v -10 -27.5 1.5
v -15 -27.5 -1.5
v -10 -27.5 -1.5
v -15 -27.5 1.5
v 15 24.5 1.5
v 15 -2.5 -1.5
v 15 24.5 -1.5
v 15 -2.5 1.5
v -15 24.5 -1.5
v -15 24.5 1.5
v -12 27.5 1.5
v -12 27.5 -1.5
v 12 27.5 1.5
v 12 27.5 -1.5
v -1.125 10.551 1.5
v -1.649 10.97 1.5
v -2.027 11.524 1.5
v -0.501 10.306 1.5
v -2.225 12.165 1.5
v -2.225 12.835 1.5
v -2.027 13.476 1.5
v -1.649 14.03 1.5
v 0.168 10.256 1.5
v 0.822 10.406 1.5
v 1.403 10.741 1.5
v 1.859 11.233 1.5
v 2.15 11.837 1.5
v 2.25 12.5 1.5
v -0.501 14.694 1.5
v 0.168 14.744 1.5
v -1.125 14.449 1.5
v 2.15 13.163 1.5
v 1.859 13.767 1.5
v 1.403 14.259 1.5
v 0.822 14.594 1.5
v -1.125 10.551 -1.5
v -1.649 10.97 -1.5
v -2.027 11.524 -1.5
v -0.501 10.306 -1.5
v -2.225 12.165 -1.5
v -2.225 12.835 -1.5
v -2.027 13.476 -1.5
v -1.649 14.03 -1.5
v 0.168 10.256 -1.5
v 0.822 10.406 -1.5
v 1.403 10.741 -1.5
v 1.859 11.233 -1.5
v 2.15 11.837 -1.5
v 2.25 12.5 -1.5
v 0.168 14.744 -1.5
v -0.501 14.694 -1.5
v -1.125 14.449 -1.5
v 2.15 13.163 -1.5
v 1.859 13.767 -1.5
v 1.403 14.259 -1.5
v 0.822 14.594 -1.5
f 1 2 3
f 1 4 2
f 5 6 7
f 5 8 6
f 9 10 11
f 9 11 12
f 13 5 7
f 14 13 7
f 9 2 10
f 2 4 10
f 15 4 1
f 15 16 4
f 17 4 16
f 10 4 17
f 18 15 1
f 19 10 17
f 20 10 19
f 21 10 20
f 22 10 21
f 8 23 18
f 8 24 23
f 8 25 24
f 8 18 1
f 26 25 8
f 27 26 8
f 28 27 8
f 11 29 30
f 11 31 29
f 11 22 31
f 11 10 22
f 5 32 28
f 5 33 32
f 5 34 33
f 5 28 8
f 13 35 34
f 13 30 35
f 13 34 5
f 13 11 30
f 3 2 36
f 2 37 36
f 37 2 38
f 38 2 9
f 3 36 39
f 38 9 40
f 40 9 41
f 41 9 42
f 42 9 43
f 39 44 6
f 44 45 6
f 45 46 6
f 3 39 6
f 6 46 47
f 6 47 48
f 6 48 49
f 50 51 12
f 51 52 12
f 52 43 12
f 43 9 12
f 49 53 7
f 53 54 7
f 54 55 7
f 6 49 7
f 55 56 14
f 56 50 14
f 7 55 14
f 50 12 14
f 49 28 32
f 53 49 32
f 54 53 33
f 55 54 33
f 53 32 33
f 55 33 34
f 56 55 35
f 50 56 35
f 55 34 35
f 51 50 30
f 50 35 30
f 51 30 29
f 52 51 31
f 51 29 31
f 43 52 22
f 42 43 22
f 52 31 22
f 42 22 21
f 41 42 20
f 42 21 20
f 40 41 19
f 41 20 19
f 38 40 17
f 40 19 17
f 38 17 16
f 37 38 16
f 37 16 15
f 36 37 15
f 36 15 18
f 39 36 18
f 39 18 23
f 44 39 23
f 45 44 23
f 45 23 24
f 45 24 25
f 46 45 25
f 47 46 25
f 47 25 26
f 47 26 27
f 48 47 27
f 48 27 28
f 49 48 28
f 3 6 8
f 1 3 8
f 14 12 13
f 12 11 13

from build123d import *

# Parameters (mm, degrees)
SKETCH1_W           = 30
SKETCH1_H           = 55
BOSS_EXTRUDE1_DEPTH = 1.5
CHAMFER1_SIZE       = 3
SKETCH2_R           = 2.25
CUT_EXTRUDE1_DEPTH  = 10
CHAMFER2_SIZE       = 25


with BuildPart() as part:
    # Sketch1 → Boss-Extrude1 (new, symmetric)
    with BuildSketch(Plane.XY):
        Rectangle(SKETCH1_W, SKETCH1_H)
    extrude(amount=BOSS_EXTRUDE1_DEPTH, both=True)

    # Chamfer1
    chamfer1_edges = [part.edges().sort_by_distance(p)[0] for p in [
        (-15, 27.5, 0),
        (15, 27.5, 0),
    ]]
    chamfer(chamfer1_edges, length=CHAMFER1_SIZE)

    # Sketch2 → Cut-Extrude1 (cut)
    with BuildSketch(Plane.XY.offset(1.5)):
        with Locations((0, 12.5)):
            Circle(SKETCH2_R)
    extrude(amount=-CUT_EXTRUDE1_DEPTH, mode=Mode.SUBTRACT)

    # Chamfer2
    chamfer2_edges = [part.edges().sort_by_distance(p)[0] for p in [
        (15, -27.5, 0),
    ]]
    chamfer(chamfer2_edges, length=CHAMFER2_SIZE)


solid = part.part
